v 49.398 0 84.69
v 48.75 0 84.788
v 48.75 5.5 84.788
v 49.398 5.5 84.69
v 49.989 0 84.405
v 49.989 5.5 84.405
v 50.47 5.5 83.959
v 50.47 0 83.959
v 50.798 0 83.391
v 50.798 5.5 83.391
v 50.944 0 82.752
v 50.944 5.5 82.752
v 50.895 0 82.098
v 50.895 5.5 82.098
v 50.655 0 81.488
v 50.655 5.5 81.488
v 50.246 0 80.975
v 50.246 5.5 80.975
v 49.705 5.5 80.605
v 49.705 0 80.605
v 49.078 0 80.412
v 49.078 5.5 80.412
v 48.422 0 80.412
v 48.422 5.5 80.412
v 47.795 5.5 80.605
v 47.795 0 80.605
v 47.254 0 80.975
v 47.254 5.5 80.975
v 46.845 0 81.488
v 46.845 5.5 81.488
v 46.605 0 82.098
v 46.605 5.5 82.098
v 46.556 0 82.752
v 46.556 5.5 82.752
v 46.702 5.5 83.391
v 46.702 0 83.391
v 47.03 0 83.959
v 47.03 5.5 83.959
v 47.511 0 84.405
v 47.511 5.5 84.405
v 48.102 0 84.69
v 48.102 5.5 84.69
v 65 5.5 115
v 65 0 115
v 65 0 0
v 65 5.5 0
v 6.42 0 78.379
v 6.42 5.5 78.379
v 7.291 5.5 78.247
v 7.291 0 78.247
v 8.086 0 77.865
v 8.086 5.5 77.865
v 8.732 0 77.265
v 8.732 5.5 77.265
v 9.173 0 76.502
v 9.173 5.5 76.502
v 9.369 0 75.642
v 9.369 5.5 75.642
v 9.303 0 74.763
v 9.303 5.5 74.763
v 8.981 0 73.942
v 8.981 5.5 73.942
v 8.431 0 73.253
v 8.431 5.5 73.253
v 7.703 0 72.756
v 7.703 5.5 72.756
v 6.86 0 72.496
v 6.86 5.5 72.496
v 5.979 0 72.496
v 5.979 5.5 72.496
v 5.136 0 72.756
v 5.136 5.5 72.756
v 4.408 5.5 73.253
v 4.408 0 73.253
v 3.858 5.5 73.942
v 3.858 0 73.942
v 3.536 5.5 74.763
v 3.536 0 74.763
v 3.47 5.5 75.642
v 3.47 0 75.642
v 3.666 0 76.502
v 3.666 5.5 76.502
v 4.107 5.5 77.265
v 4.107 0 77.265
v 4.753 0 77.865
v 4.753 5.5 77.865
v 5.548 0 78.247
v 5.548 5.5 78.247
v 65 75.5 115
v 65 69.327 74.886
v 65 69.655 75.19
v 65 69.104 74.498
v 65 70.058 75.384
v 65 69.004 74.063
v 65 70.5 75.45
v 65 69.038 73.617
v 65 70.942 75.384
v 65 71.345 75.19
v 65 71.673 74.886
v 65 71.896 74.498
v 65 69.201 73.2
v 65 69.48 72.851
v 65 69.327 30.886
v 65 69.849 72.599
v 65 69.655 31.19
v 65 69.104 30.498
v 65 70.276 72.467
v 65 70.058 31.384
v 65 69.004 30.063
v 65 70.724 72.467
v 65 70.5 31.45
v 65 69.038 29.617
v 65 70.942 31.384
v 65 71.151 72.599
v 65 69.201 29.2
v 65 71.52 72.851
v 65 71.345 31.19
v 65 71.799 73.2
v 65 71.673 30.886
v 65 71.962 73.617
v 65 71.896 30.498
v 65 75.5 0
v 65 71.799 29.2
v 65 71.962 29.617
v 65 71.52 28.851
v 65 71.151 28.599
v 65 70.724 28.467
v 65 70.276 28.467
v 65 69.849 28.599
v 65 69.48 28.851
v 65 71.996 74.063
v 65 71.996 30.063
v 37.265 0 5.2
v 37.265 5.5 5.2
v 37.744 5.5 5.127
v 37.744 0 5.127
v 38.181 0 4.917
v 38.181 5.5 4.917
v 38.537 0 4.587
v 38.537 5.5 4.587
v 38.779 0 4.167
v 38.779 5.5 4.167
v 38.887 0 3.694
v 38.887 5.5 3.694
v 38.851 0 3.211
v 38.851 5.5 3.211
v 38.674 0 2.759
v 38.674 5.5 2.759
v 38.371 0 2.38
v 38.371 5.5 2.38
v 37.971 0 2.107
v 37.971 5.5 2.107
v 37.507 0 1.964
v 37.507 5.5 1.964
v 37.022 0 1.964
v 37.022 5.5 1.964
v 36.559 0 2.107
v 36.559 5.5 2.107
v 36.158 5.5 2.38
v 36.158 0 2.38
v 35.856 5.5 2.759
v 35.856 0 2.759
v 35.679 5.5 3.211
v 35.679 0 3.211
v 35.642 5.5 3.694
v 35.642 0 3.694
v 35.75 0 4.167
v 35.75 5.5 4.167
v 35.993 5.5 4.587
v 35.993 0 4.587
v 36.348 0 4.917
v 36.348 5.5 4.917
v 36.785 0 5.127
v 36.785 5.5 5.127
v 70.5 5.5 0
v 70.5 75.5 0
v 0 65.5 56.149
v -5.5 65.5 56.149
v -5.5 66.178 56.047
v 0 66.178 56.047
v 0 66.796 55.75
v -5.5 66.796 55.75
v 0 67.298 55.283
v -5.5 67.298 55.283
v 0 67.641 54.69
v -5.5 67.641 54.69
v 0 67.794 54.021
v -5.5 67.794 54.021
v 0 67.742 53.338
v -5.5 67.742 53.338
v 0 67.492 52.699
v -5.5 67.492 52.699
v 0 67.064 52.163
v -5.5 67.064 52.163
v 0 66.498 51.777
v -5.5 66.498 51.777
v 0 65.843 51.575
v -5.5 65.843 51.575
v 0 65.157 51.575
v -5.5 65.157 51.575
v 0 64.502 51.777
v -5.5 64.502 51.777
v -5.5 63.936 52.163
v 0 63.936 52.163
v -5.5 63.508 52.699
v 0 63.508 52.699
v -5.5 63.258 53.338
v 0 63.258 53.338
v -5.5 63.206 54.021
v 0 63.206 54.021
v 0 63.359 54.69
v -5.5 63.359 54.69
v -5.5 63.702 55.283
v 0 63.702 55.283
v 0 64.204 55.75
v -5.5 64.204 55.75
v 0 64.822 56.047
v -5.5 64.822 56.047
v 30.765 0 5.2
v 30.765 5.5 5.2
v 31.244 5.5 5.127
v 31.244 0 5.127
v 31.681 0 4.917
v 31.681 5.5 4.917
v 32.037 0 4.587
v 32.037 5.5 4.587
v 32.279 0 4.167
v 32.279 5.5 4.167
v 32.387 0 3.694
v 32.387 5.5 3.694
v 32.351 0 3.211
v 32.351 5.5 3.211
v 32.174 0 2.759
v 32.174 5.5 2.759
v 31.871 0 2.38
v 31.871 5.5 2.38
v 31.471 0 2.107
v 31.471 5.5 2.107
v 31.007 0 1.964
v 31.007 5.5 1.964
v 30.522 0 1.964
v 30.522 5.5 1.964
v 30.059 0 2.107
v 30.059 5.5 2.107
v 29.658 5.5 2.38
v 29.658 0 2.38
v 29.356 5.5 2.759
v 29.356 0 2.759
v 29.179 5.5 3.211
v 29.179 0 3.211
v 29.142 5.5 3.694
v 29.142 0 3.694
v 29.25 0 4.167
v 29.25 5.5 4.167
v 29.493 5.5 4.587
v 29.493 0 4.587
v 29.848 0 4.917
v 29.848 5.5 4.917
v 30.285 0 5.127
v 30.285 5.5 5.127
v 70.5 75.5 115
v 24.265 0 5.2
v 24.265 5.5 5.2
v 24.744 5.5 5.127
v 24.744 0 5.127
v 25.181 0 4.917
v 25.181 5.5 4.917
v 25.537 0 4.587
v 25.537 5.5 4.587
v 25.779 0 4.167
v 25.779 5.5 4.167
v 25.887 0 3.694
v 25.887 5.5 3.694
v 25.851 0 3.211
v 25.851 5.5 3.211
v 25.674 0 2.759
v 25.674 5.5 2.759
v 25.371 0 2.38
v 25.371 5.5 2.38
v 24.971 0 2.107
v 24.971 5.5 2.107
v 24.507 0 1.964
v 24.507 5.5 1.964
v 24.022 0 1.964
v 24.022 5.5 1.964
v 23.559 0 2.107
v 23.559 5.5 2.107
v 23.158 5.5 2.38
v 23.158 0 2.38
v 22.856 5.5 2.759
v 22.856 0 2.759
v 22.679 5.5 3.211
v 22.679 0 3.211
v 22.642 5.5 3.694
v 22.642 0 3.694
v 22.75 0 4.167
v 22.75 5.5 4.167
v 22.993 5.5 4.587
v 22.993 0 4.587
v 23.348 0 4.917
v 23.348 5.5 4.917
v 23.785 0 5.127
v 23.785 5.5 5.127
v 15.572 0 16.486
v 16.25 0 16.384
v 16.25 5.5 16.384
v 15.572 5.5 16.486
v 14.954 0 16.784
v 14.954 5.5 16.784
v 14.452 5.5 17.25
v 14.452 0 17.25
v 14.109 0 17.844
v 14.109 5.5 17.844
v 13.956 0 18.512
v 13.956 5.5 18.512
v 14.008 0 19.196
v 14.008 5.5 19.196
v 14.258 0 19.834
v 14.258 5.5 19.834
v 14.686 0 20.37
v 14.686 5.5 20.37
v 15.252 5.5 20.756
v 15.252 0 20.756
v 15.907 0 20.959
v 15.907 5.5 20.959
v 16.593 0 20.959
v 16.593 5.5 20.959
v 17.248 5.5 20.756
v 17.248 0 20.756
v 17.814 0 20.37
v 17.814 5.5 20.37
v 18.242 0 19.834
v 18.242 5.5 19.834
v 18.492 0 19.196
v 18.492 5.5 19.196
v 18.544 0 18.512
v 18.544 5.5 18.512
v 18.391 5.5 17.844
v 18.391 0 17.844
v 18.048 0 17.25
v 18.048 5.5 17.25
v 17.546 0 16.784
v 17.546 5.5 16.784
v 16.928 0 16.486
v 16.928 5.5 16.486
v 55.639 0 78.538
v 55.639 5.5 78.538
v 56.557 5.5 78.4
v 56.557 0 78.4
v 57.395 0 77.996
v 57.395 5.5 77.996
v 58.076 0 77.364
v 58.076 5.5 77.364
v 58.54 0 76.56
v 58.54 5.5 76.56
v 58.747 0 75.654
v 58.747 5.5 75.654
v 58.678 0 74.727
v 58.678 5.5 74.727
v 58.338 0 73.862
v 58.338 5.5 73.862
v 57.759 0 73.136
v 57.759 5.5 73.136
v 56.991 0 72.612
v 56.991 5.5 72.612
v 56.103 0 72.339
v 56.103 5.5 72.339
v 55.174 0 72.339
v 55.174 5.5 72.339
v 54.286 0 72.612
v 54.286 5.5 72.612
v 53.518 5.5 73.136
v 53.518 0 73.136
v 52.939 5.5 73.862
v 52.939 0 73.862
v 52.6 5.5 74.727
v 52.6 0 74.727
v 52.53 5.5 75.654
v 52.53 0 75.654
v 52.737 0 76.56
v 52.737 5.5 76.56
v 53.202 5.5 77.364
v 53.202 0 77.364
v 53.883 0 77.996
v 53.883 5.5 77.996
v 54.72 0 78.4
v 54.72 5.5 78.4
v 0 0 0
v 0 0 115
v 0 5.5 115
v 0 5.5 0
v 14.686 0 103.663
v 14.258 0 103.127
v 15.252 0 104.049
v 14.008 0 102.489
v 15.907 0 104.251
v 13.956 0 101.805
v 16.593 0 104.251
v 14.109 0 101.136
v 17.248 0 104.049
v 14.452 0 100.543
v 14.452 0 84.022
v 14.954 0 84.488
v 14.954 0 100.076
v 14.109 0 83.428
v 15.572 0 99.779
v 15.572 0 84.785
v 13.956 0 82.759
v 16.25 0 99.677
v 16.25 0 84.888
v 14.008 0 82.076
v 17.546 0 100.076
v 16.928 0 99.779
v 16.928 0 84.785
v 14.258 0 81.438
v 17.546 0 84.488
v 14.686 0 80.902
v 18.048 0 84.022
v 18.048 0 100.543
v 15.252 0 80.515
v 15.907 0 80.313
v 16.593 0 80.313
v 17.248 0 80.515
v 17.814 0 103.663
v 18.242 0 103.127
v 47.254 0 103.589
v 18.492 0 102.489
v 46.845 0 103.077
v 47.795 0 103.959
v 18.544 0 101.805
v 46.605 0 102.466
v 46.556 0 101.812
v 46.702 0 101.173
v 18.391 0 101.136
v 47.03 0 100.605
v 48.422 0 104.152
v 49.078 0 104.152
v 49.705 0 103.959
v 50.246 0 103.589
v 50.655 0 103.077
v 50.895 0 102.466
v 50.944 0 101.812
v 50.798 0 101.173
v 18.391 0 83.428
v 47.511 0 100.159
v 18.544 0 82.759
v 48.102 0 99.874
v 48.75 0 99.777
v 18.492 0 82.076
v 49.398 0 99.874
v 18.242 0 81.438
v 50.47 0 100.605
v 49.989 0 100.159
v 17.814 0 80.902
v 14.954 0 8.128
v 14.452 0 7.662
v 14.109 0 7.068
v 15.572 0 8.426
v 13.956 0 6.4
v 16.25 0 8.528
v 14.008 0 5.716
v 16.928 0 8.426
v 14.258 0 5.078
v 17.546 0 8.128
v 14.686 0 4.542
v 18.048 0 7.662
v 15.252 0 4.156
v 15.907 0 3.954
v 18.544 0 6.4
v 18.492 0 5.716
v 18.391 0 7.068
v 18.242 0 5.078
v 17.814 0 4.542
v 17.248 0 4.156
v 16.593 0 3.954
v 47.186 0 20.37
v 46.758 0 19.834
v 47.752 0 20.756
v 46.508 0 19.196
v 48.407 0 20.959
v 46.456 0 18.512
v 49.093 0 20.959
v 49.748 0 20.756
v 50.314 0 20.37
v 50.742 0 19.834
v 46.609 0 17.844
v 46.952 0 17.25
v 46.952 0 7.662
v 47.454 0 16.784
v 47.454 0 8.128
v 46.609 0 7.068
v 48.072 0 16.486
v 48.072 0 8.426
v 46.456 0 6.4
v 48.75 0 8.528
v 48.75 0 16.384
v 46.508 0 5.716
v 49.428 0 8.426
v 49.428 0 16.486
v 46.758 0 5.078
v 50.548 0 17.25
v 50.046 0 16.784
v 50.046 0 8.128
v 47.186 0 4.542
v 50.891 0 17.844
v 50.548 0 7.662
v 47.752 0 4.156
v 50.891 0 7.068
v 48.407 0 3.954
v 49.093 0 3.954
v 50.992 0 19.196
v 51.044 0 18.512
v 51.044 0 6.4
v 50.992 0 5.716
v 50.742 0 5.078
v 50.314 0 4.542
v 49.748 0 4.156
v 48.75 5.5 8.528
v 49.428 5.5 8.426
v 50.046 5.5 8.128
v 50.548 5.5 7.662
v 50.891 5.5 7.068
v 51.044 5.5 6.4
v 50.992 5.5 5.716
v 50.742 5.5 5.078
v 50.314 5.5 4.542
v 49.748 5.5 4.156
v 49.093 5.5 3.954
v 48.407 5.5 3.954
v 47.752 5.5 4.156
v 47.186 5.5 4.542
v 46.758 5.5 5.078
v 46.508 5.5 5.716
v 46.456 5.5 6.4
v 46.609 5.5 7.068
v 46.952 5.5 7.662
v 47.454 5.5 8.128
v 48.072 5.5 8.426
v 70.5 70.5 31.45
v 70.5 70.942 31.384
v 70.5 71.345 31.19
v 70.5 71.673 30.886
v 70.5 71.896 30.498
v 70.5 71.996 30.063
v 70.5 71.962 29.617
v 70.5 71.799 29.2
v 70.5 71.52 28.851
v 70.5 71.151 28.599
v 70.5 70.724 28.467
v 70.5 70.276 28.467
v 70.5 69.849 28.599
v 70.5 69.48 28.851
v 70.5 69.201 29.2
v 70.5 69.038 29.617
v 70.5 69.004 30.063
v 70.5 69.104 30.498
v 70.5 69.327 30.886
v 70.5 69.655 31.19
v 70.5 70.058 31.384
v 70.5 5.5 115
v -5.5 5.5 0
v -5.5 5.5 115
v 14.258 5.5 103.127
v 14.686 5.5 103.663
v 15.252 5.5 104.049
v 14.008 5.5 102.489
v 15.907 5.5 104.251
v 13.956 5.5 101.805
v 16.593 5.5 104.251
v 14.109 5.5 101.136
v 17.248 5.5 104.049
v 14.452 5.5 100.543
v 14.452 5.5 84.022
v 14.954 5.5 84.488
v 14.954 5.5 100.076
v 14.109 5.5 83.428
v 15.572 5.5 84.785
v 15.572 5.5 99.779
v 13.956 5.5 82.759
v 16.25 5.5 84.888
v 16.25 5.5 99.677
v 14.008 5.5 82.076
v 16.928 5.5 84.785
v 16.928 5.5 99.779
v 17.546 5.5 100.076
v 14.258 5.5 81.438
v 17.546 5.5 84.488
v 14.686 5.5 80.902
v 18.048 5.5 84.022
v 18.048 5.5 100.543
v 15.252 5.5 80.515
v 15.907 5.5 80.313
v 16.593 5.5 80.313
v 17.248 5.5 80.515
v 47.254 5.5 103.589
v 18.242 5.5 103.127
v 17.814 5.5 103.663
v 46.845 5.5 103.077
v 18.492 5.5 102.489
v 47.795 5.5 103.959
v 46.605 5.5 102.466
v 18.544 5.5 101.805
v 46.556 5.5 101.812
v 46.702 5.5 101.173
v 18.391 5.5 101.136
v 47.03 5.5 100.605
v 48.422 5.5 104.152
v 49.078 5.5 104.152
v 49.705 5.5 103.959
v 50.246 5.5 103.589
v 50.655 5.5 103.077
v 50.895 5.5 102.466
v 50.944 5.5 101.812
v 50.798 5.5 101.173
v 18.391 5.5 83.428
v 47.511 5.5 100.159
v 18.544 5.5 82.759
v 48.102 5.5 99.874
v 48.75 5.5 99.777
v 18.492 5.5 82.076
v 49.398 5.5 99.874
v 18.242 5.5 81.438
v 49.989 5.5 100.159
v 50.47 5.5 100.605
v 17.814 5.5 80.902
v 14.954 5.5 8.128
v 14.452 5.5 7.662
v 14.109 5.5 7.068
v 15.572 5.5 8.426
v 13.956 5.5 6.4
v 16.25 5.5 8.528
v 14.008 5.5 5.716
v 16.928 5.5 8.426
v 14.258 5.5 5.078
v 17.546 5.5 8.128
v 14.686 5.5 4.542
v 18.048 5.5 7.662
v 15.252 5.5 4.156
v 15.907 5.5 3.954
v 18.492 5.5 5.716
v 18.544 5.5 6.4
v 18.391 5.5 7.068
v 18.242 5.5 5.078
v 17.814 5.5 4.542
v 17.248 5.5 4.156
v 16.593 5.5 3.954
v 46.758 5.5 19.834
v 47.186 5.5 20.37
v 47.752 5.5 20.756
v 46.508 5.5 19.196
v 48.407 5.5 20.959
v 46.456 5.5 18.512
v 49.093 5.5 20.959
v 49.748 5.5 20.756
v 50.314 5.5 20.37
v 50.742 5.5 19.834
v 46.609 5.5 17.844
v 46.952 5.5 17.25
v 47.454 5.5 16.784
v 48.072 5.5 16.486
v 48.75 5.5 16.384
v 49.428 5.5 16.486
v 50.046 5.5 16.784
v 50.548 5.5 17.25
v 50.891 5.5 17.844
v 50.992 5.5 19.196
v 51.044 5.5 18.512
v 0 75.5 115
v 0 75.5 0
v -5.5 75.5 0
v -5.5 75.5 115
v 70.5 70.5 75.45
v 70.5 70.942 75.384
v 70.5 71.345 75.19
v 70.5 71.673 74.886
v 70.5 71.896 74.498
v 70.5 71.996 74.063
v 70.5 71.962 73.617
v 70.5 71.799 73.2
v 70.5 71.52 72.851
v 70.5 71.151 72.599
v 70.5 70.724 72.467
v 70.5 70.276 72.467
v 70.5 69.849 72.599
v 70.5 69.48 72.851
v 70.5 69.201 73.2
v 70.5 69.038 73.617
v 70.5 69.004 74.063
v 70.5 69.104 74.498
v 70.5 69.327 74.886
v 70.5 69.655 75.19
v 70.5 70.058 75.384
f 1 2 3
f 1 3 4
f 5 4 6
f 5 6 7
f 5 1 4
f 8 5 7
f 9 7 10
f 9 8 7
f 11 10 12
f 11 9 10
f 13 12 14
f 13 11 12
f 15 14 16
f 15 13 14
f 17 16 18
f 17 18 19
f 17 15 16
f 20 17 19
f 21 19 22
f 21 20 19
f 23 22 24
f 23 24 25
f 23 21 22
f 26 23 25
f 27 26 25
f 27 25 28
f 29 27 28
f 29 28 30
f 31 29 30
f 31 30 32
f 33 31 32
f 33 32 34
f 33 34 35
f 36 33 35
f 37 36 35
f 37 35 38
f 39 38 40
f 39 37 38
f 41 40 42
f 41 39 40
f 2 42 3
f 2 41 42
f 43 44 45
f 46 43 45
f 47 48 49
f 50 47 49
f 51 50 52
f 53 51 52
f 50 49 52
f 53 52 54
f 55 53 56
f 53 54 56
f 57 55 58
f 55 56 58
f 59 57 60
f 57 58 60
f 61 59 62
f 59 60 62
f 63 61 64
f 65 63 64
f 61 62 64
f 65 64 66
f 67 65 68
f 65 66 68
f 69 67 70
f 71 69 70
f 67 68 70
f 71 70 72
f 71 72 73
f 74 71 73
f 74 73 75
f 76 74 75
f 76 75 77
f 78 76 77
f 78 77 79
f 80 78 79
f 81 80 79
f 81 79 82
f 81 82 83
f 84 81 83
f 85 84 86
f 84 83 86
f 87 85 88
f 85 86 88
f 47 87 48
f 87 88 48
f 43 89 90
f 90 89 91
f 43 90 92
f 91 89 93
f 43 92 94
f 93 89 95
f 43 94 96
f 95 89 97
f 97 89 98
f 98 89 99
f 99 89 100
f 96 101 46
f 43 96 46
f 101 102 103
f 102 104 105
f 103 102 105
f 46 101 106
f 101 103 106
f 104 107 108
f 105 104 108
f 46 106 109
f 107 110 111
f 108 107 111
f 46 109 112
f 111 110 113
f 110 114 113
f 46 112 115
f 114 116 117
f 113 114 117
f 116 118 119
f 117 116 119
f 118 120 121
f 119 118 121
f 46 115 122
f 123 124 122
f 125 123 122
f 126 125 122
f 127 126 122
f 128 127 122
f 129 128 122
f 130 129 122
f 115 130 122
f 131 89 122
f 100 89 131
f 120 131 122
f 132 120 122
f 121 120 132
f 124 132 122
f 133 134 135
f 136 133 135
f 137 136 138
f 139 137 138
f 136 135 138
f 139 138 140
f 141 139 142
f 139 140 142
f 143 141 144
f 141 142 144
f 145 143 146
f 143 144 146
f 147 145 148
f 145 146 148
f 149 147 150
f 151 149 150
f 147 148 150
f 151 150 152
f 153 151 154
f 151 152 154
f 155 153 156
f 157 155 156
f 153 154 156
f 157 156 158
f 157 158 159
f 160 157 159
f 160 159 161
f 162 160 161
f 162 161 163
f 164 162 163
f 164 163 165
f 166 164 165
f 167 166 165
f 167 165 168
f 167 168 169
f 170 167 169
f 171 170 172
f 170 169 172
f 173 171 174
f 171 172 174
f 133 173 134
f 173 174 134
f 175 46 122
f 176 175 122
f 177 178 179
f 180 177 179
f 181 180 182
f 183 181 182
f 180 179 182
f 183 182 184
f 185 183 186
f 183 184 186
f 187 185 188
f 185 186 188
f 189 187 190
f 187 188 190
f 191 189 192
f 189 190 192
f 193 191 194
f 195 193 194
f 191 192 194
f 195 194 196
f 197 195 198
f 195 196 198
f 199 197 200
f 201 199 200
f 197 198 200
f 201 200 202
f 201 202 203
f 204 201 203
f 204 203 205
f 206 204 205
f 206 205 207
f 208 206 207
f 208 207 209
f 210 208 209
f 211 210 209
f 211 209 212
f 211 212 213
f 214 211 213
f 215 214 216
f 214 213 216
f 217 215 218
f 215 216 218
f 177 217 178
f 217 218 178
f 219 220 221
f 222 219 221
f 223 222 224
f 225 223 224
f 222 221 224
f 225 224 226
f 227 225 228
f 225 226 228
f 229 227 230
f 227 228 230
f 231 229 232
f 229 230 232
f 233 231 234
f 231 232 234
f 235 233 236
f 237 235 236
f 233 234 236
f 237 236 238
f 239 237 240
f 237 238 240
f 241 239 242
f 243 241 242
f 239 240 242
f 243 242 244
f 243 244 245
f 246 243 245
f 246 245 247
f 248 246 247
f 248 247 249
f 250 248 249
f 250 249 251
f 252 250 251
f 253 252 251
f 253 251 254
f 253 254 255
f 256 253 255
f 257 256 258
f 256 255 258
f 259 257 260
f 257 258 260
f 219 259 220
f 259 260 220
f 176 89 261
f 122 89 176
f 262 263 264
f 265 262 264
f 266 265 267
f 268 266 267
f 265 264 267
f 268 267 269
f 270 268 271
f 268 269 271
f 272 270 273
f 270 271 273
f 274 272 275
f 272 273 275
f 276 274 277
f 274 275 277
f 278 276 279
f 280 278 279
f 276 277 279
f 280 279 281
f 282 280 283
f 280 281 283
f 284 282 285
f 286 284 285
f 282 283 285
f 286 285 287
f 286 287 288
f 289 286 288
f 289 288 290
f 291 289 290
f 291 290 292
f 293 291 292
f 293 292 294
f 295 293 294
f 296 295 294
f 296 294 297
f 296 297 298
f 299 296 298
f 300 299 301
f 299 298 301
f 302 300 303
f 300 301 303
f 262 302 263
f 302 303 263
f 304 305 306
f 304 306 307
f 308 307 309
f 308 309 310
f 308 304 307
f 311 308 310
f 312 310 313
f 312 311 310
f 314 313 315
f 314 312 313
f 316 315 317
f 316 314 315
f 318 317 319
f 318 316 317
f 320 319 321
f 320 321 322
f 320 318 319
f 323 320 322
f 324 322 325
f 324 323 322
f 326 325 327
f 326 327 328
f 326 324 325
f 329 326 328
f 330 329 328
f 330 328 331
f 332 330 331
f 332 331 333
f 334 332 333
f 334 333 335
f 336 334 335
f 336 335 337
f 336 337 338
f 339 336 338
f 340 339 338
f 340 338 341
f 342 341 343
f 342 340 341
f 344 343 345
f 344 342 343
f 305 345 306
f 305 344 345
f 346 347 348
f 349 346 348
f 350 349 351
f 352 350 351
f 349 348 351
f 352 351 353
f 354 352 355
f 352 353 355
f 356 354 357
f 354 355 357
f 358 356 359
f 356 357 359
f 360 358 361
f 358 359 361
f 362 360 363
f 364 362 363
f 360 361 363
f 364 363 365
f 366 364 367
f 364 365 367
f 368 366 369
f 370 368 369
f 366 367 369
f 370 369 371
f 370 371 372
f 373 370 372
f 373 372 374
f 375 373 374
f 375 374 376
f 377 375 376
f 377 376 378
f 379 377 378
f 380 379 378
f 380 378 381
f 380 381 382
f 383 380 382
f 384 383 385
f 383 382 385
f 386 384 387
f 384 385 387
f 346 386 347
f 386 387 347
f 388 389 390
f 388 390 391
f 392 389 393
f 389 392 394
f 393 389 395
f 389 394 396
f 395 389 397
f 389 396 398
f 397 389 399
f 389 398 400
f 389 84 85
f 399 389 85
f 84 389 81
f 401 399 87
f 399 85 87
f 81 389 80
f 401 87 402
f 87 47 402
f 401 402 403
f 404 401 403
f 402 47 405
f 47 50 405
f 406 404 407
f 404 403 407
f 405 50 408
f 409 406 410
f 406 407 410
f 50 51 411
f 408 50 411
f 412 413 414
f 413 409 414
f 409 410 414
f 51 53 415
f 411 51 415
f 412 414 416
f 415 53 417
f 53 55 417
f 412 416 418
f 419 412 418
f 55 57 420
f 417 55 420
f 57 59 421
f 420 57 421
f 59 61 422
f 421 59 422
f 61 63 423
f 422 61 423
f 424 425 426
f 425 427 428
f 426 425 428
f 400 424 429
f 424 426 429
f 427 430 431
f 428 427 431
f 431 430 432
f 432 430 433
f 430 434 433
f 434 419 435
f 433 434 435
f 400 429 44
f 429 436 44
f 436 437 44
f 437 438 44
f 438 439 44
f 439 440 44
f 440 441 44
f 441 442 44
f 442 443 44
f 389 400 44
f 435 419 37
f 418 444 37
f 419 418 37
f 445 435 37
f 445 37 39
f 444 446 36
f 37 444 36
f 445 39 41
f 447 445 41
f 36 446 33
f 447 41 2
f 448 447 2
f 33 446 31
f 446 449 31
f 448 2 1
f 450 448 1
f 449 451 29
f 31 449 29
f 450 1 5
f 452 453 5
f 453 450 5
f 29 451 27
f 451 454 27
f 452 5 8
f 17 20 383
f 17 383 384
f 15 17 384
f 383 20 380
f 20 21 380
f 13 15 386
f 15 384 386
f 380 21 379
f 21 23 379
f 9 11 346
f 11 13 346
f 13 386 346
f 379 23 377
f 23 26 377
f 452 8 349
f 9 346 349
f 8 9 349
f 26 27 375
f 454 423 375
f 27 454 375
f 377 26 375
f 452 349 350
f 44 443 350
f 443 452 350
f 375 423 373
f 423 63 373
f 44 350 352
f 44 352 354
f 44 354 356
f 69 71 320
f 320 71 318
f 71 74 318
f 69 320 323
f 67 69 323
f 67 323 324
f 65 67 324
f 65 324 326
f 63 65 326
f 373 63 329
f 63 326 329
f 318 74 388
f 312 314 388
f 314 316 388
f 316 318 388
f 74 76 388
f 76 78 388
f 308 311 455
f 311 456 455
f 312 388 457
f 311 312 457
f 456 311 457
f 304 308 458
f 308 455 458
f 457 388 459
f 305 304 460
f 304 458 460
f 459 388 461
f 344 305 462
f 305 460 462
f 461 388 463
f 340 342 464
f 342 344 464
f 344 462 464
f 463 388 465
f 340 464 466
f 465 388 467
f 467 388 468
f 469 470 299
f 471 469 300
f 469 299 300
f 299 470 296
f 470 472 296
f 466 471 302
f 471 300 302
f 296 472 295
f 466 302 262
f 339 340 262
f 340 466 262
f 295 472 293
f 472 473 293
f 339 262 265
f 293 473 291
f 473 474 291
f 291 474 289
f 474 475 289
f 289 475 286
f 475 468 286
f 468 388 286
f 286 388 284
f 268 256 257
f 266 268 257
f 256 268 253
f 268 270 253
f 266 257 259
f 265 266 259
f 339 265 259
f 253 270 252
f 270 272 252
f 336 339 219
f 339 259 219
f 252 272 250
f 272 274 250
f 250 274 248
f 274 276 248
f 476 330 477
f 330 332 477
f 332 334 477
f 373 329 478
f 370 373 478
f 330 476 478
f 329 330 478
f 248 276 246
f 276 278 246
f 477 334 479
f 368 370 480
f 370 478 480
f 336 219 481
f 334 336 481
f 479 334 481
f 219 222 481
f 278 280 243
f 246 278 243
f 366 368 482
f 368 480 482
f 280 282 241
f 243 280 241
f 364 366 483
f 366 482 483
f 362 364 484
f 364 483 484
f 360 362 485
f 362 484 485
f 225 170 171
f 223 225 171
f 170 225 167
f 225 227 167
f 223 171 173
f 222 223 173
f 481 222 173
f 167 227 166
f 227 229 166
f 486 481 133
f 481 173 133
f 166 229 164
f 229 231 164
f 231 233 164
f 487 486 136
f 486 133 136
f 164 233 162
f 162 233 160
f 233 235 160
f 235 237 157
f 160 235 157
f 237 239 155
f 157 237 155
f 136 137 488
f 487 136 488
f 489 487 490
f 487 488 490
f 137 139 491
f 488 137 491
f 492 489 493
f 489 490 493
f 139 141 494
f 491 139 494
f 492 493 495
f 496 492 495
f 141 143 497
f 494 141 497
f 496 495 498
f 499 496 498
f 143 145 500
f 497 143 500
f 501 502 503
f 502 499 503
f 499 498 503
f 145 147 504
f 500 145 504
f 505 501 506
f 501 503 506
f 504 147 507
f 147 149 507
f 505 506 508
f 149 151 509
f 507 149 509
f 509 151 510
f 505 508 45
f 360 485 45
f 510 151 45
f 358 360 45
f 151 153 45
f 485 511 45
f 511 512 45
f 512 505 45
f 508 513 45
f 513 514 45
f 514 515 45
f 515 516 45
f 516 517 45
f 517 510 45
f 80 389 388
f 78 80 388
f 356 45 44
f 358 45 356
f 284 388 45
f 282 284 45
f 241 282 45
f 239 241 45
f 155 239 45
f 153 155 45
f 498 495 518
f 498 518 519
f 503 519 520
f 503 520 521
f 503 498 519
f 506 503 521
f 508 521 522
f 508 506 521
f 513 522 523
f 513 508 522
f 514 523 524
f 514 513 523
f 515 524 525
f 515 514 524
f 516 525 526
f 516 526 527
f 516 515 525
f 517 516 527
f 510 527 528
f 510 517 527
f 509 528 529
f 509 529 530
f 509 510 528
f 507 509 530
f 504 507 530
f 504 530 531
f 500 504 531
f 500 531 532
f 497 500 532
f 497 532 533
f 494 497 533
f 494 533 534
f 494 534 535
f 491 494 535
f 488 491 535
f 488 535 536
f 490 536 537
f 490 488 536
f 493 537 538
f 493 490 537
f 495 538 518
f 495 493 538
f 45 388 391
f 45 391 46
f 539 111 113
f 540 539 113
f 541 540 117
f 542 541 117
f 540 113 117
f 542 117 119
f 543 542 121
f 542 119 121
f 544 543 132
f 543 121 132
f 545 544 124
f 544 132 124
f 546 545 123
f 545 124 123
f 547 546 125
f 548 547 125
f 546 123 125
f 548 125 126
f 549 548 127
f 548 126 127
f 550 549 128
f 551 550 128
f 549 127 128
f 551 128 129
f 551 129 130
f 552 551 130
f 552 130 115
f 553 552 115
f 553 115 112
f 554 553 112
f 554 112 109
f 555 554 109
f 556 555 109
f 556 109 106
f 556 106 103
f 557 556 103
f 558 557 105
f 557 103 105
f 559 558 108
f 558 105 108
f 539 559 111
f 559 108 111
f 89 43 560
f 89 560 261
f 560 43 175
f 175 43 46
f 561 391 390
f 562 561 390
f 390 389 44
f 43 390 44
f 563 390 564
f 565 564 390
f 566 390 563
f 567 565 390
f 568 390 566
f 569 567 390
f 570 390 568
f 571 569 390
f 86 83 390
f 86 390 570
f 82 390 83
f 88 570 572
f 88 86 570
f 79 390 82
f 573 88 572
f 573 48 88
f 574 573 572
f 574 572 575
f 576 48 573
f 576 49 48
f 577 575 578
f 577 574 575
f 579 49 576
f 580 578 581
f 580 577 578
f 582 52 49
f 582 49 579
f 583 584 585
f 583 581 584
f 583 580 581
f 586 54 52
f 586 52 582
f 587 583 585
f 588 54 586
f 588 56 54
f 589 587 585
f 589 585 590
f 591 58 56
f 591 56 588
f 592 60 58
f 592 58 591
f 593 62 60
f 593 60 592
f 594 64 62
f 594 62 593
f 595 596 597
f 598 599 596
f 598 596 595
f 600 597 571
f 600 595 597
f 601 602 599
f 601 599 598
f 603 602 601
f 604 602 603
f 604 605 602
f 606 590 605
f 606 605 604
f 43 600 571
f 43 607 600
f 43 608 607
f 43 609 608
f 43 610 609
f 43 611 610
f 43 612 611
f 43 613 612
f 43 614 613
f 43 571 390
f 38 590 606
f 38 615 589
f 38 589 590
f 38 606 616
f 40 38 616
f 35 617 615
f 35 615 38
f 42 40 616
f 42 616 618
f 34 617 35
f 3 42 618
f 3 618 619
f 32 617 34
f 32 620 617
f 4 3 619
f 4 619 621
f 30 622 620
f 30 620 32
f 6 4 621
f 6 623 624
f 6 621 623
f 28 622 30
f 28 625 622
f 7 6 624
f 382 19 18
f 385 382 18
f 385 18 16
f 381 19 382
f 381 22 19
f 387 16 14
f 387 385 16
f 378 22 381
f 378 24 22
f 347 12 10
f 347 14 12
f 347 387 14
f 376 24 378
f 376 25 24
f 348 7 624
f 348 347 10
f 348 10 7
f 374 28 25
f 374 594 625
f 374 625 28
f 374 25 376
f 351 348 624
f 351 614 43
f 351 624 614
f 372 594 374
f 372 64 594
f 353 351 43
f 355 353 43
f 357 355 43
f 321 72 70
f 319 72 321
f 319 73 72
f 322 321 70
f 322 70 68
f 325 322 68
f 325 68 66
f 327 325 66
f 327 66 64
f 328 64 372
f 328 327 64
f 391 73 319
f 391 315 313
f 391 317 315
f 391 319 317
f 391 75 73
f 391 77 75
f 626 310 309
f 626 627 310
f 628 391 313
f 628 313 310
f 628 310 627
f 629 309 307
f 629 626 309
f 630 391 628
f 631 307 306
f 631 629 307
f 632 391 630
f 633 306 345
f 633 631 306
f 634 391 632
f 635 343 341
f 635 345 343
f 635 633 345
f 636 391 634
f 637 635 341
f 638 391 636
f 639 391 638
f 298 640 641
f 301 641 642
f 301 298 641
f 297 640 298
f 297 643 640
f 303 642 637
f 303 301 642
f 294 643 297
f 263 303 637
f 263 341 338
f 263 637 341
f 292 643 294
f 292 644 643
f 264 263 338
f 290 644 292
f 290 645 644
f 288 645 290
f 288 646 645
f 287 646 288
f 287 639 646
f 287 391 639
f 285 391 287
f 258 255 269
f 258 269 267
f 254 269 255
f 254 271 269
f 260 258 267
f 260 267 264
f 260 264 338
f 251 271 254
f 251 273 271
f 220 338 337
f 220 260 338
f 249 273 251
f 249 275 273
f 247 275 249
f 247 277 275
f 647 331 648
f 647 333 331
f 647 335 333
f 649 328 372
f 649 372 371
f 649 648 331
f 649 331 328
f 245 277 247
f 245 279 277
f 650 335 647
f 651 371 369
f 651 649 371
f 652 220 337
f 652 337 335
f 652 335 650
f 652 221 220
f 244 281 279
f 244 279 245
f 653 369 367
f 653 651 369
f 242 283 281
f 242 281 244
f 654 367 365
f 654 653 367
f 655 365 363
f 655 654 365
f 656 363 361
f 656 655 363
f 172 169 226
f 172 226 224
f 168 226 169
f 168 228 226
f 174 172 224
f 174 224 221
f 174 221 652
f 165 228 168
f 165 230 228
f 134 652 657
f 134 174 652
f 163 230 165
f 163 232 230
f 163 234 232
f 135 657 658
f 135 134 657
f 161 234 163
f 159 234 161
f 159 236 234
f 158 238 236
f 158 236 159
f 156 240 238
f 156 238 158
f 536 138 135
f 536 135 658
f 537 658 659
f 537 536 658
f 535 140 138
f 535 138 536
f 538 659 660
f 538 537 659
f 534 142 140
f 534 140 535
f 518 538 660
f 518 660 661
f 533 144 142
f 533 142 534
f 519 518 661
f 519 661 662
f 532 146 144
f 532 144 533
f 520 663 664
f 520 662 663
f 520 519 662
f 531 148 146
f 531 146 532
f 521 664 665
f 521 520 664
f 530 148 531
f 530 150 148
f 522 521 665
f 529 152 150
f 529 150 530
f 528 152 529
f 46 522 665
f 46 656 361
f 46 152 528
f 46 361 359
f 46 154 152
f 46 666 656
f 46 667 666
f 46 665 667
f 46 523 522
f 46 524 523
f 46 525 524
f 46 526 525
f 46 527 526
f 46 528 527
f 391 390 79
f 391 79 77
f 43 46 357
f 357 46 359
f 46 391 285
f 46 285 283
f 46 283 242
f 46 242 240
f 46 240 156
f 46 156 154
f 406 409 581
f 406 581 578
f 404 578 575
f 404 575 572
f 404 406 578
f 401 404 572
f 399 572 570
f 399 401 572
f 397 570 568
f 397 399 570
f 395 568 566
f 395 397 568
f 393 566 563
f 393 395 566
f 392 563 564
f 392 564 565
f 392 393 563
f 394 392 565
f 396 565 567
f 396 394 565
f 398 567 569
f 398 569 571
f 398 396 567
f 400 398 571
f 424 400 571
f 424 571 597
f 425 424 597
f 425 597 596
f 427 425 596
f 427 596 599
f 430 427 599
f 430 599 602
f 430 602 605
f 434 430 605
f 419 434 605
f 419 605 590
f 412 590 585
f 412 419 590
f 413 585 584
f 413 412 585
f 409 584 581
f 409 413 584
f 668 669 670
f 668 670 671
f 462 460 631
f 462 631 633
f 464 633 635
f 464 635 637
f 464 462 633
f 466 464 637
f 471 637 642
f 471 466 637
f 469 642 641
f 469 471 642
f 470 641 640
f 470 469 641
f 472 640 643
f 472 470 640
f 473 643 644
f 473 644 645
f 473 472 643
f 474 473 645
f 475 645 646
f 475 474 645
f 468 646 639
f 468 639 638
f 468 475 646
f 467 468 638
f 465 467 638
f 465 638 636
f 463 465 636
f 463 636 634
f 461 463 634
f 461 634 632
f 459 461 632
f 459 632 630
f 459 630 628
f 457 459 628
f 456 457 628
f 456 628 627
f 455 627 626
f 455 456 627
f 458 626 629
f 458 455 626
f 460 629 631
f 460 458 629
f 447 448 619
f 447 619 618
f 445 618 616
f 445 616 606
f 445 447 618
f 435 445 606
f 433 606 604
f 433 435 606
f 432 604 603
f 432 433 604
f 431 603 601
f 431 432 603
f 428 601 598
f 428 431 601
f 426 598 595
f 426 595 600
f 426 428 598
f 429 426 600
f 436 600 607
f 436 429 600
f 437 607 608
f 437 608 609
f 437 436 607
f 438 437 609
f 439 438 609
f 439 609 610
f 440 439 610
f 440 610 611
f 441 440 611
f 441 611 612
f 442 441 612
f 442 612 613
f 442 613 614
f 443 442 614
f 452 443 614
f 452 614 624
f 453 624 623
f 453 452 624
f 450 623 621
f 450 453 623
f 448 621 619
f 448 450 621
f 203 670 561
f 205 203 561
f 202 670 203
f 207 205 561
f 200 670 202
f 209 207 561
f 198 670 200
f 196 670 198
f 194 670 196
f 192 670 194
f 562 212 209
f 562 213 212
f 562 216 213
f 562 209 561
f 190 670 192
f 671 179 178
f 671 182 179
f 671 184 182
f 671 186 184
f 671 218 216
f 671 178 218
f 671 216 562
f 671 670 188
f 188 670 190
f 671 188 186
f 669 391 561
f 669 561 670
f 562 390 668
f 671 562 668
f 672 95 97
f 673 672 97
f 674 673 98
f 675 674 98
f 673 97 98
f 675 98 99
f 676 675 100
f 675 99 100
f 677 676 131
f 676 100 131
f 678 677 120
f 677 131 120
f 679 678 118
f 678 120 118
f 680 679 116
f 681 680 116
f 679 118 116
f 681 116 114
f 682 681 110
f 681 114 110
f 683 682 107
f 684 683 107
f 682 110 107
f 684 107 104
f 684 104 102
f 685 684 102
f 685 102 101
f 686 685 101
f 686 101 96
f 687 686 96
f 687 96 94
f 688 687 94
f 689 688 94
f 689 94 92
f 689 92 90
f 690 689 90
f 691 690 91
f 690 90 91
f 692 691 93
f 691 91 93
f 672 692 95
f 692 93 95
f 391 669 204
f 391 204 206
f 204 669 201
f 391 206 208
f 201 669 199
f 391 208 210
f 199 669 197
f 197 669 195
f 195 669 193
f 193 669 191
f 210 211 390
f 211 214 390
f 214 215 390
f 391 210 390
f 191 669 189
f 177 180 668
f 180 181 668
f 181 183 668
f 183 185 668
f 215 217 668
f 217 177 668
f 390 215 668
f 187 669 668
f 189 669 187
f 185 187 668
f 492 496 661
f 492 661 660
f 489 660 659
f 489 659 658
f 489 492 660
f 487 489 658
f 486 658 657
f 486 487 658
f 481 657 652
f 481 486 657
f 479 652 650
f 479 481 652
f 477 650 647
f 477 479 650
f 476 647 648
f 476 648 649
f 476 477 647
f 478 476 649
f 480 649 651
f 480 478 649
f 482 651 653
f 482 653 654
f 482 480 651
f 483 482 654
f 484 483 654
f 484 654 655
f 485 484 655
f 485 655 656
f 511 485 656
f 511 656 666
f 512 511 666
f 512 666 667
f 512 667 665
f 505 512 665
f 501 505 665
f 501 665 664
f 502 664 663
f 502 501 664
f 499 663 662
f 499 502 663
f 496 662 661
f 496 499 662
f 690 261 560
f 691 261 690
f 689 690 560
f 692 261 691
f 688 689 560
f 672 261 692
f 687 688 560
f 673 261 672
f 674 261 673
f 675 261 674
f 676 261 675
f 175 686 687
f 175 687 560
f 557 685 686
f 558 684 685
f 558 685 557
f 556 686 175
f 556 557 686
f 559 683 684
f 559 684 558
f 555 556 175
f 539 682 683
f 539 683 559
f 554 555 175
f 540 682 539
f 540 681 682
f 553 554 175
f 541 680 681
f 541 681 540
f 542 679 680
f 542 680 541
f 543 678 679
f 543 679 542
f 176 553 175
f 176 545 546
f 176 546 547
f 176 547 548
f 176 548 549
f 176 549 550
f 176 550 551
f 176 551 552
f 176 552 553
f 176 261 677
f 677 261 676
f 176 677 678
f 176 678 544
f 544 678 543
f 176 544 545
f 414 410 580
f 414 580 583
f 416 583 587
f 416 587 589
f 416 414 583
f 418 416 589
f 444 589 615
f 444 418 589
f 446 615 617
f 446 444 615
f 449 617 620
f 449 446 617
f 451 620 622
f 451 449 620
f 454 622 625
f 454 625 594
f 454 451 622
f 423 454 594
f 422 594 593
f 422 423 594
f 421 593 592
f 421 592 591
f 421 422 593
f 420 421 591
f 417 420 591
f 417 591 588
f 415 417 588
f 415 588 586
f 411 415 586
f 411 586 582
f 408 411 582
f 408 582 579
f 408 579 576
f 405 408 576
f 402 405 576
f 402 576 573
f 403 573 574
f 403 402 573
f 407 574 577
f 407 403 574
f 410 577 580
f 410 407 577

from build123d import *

# Parameters (mm, degrees)
CROQUIS1_W              = 65
CROQUIS1_H              = 115
CROQUIS1_R              = 2.3
CROQUIS1_R_2            = 2.2
SALIENTE_EXTRUIR1_DEPTH = 5.5
CROQUIS2_W              = 115
CROQUIS2_H              = 70
SALIENTE_EXTRUIR2_DEPTH = 5.5
CROQUIS3_W              = 115
CROQUIS3_H              = 70
SALIENTE_EXTRUIR3_DEPTH = 5.5
CROQUIS4_R              = 3.117146835
CROQUIS4_R_2            = 2.957808417
CORTAR_EXTRUIR1_DEPTH   = 5.5
CROQUIS5_R              = 2.3
CORTAR_EXTRUIR2_DEPTH   = 5.5
CROQUIS6_R              = 1.626960879
CORTAR_EXTRUIR3_DEPTH   = 5.5
CROQUIS7_R              = 1.5
CORTAR_EXTRUIR4_DEPTH   = 5.5


with BuildPart() as part:
    # Croquis1 → Saliente-Extruir1 (new body)
    with BuildSketch(Plane(origin=(0, 0, 0), x_dir=(1, 0, 0), z_dir=(0, 1, 0))):
        with Locations((32.5, -57.5)):
            Rectangle(CROQUIS1_W, CROQUIS1_H)
        with Locations(Location((16.25, -6.22808869, 0), (0, 0, 270))):
            Circle(CROQUIS1_R, mode=Mode.SUBTRACT)
        with Locations(Location((48.75, -6.22808869, 0), (0, 0, 270))):
            Circle(CROQUIS1_R, mode=Mode.SUBTRACT)
        with Locations(Location((48.75, -18.68426607, 0), (0, 0, 90))):
            Circle(CROQUIS1_R, mode=Mode.SUBTRACT)
        with Locations(Location((16.25, -18.68426607, 0), (0, 0, 90))):
            Circle(CROQUIS1_R, mode=Mode.SUBTRACT)
        with Locations(Location((16.25, -82.587524247, 0), (0, 0, 270))):
            Circle(CROQUIS1_R, mode=Mode.SUBTRACT)
        with Locations(Location((48.75, -82.587524247, 0), (0, 0, 270))):
            Circle(CROQUIS1_R_2, mode=Mode.SUBTRACT)
        with Locations(Location((48.75, -101.976725706, 0), (0, 0, 90))):
            Circle(CROQUIS1_R_2, mode=Mode.SUBTRACT)
        with Locations(Location((16.25, -101.976725706, 0), (0, 0, 90))):
            Circle(CROQUIS1_R, mode=Mode.SUBTRACT)
    extrude(amount=SALIENTE_EXTRUIR1_DEPTH)

    # Croquis4 → Cortar-Extruir1 (cut)
    with BuildSketch(Plane(origin=(0, 5.5, 0), x_dir=(1, 0, 0), z_dir=(0, 1, 0))):
        with Locations(Location((55.638593898, -75.420943833, 0), (0, 0, 270))):
            Circle(CROQUIS4_R)
        with Locations(Location((6.419577958, -75.420943833, 0), (0, 0, 270))):
            Circle(CROQUIS4_R_2)
    extrude(amount=-CORTAR_EXTRUIR1_DEPTH, mode=Mode.SUBTRACT)

    # Croquis6 → Cortar-Extruir3 (cut)
    with BuildSketch(Plane(origin=(0, 5.5, 0), x_dir=(1, 0, 0), z_dir=(0, 1, 0))):
        with Locations(Location((24.264689506, -3.572552561, 0), (0, 0, 270))):
            Circle(CROQUIS6_R)
        with Locations(Location((30.764689506, -3.572552561, 0), (0, 0, 270))):
            Circle(CROQUIS6_R)
        with Locations(Location((37.264689506, -3.572552561, 0), (0, 0, 270))):
            Circle(CROQUIS6_R)
    extrude(amount=-CORTAR_EXTRUIR3_DEPTH, mode=Mode.SUBTRACT)


with BuildPart() as body_2:
    # Croquis2 → Saliente-Extruir2 (new body)
    with BuildSketch(Plane.ZY):
        with Locations((57.5, 40.5)):
            Rectangle(CROQUIS2_W, CROQUIS2_H)
    extrude(amount=SALIENTE_EXTRUIR2_DEPTH)

    # Croquis5 → Cortar-Extruir2 (cut)
    with BuildSketch(Plane.ZY.offset(5.5)):
        with Locations((53.849390676, 65.5)):
            Circle(CROQUIS5_R)
    extrude(amount=-CORTAR_EXTRUIR2_DEPTH, mode=Mode.SUBTRACT)


with BuildPart() as body_3:
    # Croquis3 → Saliente-Extruir3 (new body)
    with BuildSketch(Plane(origin=(65, 0, 0), x_dir=(0, 0, -1), z_dir=(1, 0, 0))):
        with Locations((-57.5, 40.5)):
            Rectangle(CROQUIS3_W, CROQUIS3_H)
    extrude(amount=SALIENTE_EXTRUIR3_DEPTH)

    # Croquis7 → Cortar-Extruir4 (cut)
    with BuildSketch(Plane.ZY.offset(-65)):
        with Locations((29.950463966, 70.5)):
            Circle(CROQUIS7_R)
        with Locations((73.950463966, 70.5)):
            Circle(CROQUIS7_R)
    extrude(amount=-CORTAR_EXTRUIR4_DEPTH, mode=Mode.SUBTRACT)


solid = Compound([part.part, body_2.part, body_3.part])
